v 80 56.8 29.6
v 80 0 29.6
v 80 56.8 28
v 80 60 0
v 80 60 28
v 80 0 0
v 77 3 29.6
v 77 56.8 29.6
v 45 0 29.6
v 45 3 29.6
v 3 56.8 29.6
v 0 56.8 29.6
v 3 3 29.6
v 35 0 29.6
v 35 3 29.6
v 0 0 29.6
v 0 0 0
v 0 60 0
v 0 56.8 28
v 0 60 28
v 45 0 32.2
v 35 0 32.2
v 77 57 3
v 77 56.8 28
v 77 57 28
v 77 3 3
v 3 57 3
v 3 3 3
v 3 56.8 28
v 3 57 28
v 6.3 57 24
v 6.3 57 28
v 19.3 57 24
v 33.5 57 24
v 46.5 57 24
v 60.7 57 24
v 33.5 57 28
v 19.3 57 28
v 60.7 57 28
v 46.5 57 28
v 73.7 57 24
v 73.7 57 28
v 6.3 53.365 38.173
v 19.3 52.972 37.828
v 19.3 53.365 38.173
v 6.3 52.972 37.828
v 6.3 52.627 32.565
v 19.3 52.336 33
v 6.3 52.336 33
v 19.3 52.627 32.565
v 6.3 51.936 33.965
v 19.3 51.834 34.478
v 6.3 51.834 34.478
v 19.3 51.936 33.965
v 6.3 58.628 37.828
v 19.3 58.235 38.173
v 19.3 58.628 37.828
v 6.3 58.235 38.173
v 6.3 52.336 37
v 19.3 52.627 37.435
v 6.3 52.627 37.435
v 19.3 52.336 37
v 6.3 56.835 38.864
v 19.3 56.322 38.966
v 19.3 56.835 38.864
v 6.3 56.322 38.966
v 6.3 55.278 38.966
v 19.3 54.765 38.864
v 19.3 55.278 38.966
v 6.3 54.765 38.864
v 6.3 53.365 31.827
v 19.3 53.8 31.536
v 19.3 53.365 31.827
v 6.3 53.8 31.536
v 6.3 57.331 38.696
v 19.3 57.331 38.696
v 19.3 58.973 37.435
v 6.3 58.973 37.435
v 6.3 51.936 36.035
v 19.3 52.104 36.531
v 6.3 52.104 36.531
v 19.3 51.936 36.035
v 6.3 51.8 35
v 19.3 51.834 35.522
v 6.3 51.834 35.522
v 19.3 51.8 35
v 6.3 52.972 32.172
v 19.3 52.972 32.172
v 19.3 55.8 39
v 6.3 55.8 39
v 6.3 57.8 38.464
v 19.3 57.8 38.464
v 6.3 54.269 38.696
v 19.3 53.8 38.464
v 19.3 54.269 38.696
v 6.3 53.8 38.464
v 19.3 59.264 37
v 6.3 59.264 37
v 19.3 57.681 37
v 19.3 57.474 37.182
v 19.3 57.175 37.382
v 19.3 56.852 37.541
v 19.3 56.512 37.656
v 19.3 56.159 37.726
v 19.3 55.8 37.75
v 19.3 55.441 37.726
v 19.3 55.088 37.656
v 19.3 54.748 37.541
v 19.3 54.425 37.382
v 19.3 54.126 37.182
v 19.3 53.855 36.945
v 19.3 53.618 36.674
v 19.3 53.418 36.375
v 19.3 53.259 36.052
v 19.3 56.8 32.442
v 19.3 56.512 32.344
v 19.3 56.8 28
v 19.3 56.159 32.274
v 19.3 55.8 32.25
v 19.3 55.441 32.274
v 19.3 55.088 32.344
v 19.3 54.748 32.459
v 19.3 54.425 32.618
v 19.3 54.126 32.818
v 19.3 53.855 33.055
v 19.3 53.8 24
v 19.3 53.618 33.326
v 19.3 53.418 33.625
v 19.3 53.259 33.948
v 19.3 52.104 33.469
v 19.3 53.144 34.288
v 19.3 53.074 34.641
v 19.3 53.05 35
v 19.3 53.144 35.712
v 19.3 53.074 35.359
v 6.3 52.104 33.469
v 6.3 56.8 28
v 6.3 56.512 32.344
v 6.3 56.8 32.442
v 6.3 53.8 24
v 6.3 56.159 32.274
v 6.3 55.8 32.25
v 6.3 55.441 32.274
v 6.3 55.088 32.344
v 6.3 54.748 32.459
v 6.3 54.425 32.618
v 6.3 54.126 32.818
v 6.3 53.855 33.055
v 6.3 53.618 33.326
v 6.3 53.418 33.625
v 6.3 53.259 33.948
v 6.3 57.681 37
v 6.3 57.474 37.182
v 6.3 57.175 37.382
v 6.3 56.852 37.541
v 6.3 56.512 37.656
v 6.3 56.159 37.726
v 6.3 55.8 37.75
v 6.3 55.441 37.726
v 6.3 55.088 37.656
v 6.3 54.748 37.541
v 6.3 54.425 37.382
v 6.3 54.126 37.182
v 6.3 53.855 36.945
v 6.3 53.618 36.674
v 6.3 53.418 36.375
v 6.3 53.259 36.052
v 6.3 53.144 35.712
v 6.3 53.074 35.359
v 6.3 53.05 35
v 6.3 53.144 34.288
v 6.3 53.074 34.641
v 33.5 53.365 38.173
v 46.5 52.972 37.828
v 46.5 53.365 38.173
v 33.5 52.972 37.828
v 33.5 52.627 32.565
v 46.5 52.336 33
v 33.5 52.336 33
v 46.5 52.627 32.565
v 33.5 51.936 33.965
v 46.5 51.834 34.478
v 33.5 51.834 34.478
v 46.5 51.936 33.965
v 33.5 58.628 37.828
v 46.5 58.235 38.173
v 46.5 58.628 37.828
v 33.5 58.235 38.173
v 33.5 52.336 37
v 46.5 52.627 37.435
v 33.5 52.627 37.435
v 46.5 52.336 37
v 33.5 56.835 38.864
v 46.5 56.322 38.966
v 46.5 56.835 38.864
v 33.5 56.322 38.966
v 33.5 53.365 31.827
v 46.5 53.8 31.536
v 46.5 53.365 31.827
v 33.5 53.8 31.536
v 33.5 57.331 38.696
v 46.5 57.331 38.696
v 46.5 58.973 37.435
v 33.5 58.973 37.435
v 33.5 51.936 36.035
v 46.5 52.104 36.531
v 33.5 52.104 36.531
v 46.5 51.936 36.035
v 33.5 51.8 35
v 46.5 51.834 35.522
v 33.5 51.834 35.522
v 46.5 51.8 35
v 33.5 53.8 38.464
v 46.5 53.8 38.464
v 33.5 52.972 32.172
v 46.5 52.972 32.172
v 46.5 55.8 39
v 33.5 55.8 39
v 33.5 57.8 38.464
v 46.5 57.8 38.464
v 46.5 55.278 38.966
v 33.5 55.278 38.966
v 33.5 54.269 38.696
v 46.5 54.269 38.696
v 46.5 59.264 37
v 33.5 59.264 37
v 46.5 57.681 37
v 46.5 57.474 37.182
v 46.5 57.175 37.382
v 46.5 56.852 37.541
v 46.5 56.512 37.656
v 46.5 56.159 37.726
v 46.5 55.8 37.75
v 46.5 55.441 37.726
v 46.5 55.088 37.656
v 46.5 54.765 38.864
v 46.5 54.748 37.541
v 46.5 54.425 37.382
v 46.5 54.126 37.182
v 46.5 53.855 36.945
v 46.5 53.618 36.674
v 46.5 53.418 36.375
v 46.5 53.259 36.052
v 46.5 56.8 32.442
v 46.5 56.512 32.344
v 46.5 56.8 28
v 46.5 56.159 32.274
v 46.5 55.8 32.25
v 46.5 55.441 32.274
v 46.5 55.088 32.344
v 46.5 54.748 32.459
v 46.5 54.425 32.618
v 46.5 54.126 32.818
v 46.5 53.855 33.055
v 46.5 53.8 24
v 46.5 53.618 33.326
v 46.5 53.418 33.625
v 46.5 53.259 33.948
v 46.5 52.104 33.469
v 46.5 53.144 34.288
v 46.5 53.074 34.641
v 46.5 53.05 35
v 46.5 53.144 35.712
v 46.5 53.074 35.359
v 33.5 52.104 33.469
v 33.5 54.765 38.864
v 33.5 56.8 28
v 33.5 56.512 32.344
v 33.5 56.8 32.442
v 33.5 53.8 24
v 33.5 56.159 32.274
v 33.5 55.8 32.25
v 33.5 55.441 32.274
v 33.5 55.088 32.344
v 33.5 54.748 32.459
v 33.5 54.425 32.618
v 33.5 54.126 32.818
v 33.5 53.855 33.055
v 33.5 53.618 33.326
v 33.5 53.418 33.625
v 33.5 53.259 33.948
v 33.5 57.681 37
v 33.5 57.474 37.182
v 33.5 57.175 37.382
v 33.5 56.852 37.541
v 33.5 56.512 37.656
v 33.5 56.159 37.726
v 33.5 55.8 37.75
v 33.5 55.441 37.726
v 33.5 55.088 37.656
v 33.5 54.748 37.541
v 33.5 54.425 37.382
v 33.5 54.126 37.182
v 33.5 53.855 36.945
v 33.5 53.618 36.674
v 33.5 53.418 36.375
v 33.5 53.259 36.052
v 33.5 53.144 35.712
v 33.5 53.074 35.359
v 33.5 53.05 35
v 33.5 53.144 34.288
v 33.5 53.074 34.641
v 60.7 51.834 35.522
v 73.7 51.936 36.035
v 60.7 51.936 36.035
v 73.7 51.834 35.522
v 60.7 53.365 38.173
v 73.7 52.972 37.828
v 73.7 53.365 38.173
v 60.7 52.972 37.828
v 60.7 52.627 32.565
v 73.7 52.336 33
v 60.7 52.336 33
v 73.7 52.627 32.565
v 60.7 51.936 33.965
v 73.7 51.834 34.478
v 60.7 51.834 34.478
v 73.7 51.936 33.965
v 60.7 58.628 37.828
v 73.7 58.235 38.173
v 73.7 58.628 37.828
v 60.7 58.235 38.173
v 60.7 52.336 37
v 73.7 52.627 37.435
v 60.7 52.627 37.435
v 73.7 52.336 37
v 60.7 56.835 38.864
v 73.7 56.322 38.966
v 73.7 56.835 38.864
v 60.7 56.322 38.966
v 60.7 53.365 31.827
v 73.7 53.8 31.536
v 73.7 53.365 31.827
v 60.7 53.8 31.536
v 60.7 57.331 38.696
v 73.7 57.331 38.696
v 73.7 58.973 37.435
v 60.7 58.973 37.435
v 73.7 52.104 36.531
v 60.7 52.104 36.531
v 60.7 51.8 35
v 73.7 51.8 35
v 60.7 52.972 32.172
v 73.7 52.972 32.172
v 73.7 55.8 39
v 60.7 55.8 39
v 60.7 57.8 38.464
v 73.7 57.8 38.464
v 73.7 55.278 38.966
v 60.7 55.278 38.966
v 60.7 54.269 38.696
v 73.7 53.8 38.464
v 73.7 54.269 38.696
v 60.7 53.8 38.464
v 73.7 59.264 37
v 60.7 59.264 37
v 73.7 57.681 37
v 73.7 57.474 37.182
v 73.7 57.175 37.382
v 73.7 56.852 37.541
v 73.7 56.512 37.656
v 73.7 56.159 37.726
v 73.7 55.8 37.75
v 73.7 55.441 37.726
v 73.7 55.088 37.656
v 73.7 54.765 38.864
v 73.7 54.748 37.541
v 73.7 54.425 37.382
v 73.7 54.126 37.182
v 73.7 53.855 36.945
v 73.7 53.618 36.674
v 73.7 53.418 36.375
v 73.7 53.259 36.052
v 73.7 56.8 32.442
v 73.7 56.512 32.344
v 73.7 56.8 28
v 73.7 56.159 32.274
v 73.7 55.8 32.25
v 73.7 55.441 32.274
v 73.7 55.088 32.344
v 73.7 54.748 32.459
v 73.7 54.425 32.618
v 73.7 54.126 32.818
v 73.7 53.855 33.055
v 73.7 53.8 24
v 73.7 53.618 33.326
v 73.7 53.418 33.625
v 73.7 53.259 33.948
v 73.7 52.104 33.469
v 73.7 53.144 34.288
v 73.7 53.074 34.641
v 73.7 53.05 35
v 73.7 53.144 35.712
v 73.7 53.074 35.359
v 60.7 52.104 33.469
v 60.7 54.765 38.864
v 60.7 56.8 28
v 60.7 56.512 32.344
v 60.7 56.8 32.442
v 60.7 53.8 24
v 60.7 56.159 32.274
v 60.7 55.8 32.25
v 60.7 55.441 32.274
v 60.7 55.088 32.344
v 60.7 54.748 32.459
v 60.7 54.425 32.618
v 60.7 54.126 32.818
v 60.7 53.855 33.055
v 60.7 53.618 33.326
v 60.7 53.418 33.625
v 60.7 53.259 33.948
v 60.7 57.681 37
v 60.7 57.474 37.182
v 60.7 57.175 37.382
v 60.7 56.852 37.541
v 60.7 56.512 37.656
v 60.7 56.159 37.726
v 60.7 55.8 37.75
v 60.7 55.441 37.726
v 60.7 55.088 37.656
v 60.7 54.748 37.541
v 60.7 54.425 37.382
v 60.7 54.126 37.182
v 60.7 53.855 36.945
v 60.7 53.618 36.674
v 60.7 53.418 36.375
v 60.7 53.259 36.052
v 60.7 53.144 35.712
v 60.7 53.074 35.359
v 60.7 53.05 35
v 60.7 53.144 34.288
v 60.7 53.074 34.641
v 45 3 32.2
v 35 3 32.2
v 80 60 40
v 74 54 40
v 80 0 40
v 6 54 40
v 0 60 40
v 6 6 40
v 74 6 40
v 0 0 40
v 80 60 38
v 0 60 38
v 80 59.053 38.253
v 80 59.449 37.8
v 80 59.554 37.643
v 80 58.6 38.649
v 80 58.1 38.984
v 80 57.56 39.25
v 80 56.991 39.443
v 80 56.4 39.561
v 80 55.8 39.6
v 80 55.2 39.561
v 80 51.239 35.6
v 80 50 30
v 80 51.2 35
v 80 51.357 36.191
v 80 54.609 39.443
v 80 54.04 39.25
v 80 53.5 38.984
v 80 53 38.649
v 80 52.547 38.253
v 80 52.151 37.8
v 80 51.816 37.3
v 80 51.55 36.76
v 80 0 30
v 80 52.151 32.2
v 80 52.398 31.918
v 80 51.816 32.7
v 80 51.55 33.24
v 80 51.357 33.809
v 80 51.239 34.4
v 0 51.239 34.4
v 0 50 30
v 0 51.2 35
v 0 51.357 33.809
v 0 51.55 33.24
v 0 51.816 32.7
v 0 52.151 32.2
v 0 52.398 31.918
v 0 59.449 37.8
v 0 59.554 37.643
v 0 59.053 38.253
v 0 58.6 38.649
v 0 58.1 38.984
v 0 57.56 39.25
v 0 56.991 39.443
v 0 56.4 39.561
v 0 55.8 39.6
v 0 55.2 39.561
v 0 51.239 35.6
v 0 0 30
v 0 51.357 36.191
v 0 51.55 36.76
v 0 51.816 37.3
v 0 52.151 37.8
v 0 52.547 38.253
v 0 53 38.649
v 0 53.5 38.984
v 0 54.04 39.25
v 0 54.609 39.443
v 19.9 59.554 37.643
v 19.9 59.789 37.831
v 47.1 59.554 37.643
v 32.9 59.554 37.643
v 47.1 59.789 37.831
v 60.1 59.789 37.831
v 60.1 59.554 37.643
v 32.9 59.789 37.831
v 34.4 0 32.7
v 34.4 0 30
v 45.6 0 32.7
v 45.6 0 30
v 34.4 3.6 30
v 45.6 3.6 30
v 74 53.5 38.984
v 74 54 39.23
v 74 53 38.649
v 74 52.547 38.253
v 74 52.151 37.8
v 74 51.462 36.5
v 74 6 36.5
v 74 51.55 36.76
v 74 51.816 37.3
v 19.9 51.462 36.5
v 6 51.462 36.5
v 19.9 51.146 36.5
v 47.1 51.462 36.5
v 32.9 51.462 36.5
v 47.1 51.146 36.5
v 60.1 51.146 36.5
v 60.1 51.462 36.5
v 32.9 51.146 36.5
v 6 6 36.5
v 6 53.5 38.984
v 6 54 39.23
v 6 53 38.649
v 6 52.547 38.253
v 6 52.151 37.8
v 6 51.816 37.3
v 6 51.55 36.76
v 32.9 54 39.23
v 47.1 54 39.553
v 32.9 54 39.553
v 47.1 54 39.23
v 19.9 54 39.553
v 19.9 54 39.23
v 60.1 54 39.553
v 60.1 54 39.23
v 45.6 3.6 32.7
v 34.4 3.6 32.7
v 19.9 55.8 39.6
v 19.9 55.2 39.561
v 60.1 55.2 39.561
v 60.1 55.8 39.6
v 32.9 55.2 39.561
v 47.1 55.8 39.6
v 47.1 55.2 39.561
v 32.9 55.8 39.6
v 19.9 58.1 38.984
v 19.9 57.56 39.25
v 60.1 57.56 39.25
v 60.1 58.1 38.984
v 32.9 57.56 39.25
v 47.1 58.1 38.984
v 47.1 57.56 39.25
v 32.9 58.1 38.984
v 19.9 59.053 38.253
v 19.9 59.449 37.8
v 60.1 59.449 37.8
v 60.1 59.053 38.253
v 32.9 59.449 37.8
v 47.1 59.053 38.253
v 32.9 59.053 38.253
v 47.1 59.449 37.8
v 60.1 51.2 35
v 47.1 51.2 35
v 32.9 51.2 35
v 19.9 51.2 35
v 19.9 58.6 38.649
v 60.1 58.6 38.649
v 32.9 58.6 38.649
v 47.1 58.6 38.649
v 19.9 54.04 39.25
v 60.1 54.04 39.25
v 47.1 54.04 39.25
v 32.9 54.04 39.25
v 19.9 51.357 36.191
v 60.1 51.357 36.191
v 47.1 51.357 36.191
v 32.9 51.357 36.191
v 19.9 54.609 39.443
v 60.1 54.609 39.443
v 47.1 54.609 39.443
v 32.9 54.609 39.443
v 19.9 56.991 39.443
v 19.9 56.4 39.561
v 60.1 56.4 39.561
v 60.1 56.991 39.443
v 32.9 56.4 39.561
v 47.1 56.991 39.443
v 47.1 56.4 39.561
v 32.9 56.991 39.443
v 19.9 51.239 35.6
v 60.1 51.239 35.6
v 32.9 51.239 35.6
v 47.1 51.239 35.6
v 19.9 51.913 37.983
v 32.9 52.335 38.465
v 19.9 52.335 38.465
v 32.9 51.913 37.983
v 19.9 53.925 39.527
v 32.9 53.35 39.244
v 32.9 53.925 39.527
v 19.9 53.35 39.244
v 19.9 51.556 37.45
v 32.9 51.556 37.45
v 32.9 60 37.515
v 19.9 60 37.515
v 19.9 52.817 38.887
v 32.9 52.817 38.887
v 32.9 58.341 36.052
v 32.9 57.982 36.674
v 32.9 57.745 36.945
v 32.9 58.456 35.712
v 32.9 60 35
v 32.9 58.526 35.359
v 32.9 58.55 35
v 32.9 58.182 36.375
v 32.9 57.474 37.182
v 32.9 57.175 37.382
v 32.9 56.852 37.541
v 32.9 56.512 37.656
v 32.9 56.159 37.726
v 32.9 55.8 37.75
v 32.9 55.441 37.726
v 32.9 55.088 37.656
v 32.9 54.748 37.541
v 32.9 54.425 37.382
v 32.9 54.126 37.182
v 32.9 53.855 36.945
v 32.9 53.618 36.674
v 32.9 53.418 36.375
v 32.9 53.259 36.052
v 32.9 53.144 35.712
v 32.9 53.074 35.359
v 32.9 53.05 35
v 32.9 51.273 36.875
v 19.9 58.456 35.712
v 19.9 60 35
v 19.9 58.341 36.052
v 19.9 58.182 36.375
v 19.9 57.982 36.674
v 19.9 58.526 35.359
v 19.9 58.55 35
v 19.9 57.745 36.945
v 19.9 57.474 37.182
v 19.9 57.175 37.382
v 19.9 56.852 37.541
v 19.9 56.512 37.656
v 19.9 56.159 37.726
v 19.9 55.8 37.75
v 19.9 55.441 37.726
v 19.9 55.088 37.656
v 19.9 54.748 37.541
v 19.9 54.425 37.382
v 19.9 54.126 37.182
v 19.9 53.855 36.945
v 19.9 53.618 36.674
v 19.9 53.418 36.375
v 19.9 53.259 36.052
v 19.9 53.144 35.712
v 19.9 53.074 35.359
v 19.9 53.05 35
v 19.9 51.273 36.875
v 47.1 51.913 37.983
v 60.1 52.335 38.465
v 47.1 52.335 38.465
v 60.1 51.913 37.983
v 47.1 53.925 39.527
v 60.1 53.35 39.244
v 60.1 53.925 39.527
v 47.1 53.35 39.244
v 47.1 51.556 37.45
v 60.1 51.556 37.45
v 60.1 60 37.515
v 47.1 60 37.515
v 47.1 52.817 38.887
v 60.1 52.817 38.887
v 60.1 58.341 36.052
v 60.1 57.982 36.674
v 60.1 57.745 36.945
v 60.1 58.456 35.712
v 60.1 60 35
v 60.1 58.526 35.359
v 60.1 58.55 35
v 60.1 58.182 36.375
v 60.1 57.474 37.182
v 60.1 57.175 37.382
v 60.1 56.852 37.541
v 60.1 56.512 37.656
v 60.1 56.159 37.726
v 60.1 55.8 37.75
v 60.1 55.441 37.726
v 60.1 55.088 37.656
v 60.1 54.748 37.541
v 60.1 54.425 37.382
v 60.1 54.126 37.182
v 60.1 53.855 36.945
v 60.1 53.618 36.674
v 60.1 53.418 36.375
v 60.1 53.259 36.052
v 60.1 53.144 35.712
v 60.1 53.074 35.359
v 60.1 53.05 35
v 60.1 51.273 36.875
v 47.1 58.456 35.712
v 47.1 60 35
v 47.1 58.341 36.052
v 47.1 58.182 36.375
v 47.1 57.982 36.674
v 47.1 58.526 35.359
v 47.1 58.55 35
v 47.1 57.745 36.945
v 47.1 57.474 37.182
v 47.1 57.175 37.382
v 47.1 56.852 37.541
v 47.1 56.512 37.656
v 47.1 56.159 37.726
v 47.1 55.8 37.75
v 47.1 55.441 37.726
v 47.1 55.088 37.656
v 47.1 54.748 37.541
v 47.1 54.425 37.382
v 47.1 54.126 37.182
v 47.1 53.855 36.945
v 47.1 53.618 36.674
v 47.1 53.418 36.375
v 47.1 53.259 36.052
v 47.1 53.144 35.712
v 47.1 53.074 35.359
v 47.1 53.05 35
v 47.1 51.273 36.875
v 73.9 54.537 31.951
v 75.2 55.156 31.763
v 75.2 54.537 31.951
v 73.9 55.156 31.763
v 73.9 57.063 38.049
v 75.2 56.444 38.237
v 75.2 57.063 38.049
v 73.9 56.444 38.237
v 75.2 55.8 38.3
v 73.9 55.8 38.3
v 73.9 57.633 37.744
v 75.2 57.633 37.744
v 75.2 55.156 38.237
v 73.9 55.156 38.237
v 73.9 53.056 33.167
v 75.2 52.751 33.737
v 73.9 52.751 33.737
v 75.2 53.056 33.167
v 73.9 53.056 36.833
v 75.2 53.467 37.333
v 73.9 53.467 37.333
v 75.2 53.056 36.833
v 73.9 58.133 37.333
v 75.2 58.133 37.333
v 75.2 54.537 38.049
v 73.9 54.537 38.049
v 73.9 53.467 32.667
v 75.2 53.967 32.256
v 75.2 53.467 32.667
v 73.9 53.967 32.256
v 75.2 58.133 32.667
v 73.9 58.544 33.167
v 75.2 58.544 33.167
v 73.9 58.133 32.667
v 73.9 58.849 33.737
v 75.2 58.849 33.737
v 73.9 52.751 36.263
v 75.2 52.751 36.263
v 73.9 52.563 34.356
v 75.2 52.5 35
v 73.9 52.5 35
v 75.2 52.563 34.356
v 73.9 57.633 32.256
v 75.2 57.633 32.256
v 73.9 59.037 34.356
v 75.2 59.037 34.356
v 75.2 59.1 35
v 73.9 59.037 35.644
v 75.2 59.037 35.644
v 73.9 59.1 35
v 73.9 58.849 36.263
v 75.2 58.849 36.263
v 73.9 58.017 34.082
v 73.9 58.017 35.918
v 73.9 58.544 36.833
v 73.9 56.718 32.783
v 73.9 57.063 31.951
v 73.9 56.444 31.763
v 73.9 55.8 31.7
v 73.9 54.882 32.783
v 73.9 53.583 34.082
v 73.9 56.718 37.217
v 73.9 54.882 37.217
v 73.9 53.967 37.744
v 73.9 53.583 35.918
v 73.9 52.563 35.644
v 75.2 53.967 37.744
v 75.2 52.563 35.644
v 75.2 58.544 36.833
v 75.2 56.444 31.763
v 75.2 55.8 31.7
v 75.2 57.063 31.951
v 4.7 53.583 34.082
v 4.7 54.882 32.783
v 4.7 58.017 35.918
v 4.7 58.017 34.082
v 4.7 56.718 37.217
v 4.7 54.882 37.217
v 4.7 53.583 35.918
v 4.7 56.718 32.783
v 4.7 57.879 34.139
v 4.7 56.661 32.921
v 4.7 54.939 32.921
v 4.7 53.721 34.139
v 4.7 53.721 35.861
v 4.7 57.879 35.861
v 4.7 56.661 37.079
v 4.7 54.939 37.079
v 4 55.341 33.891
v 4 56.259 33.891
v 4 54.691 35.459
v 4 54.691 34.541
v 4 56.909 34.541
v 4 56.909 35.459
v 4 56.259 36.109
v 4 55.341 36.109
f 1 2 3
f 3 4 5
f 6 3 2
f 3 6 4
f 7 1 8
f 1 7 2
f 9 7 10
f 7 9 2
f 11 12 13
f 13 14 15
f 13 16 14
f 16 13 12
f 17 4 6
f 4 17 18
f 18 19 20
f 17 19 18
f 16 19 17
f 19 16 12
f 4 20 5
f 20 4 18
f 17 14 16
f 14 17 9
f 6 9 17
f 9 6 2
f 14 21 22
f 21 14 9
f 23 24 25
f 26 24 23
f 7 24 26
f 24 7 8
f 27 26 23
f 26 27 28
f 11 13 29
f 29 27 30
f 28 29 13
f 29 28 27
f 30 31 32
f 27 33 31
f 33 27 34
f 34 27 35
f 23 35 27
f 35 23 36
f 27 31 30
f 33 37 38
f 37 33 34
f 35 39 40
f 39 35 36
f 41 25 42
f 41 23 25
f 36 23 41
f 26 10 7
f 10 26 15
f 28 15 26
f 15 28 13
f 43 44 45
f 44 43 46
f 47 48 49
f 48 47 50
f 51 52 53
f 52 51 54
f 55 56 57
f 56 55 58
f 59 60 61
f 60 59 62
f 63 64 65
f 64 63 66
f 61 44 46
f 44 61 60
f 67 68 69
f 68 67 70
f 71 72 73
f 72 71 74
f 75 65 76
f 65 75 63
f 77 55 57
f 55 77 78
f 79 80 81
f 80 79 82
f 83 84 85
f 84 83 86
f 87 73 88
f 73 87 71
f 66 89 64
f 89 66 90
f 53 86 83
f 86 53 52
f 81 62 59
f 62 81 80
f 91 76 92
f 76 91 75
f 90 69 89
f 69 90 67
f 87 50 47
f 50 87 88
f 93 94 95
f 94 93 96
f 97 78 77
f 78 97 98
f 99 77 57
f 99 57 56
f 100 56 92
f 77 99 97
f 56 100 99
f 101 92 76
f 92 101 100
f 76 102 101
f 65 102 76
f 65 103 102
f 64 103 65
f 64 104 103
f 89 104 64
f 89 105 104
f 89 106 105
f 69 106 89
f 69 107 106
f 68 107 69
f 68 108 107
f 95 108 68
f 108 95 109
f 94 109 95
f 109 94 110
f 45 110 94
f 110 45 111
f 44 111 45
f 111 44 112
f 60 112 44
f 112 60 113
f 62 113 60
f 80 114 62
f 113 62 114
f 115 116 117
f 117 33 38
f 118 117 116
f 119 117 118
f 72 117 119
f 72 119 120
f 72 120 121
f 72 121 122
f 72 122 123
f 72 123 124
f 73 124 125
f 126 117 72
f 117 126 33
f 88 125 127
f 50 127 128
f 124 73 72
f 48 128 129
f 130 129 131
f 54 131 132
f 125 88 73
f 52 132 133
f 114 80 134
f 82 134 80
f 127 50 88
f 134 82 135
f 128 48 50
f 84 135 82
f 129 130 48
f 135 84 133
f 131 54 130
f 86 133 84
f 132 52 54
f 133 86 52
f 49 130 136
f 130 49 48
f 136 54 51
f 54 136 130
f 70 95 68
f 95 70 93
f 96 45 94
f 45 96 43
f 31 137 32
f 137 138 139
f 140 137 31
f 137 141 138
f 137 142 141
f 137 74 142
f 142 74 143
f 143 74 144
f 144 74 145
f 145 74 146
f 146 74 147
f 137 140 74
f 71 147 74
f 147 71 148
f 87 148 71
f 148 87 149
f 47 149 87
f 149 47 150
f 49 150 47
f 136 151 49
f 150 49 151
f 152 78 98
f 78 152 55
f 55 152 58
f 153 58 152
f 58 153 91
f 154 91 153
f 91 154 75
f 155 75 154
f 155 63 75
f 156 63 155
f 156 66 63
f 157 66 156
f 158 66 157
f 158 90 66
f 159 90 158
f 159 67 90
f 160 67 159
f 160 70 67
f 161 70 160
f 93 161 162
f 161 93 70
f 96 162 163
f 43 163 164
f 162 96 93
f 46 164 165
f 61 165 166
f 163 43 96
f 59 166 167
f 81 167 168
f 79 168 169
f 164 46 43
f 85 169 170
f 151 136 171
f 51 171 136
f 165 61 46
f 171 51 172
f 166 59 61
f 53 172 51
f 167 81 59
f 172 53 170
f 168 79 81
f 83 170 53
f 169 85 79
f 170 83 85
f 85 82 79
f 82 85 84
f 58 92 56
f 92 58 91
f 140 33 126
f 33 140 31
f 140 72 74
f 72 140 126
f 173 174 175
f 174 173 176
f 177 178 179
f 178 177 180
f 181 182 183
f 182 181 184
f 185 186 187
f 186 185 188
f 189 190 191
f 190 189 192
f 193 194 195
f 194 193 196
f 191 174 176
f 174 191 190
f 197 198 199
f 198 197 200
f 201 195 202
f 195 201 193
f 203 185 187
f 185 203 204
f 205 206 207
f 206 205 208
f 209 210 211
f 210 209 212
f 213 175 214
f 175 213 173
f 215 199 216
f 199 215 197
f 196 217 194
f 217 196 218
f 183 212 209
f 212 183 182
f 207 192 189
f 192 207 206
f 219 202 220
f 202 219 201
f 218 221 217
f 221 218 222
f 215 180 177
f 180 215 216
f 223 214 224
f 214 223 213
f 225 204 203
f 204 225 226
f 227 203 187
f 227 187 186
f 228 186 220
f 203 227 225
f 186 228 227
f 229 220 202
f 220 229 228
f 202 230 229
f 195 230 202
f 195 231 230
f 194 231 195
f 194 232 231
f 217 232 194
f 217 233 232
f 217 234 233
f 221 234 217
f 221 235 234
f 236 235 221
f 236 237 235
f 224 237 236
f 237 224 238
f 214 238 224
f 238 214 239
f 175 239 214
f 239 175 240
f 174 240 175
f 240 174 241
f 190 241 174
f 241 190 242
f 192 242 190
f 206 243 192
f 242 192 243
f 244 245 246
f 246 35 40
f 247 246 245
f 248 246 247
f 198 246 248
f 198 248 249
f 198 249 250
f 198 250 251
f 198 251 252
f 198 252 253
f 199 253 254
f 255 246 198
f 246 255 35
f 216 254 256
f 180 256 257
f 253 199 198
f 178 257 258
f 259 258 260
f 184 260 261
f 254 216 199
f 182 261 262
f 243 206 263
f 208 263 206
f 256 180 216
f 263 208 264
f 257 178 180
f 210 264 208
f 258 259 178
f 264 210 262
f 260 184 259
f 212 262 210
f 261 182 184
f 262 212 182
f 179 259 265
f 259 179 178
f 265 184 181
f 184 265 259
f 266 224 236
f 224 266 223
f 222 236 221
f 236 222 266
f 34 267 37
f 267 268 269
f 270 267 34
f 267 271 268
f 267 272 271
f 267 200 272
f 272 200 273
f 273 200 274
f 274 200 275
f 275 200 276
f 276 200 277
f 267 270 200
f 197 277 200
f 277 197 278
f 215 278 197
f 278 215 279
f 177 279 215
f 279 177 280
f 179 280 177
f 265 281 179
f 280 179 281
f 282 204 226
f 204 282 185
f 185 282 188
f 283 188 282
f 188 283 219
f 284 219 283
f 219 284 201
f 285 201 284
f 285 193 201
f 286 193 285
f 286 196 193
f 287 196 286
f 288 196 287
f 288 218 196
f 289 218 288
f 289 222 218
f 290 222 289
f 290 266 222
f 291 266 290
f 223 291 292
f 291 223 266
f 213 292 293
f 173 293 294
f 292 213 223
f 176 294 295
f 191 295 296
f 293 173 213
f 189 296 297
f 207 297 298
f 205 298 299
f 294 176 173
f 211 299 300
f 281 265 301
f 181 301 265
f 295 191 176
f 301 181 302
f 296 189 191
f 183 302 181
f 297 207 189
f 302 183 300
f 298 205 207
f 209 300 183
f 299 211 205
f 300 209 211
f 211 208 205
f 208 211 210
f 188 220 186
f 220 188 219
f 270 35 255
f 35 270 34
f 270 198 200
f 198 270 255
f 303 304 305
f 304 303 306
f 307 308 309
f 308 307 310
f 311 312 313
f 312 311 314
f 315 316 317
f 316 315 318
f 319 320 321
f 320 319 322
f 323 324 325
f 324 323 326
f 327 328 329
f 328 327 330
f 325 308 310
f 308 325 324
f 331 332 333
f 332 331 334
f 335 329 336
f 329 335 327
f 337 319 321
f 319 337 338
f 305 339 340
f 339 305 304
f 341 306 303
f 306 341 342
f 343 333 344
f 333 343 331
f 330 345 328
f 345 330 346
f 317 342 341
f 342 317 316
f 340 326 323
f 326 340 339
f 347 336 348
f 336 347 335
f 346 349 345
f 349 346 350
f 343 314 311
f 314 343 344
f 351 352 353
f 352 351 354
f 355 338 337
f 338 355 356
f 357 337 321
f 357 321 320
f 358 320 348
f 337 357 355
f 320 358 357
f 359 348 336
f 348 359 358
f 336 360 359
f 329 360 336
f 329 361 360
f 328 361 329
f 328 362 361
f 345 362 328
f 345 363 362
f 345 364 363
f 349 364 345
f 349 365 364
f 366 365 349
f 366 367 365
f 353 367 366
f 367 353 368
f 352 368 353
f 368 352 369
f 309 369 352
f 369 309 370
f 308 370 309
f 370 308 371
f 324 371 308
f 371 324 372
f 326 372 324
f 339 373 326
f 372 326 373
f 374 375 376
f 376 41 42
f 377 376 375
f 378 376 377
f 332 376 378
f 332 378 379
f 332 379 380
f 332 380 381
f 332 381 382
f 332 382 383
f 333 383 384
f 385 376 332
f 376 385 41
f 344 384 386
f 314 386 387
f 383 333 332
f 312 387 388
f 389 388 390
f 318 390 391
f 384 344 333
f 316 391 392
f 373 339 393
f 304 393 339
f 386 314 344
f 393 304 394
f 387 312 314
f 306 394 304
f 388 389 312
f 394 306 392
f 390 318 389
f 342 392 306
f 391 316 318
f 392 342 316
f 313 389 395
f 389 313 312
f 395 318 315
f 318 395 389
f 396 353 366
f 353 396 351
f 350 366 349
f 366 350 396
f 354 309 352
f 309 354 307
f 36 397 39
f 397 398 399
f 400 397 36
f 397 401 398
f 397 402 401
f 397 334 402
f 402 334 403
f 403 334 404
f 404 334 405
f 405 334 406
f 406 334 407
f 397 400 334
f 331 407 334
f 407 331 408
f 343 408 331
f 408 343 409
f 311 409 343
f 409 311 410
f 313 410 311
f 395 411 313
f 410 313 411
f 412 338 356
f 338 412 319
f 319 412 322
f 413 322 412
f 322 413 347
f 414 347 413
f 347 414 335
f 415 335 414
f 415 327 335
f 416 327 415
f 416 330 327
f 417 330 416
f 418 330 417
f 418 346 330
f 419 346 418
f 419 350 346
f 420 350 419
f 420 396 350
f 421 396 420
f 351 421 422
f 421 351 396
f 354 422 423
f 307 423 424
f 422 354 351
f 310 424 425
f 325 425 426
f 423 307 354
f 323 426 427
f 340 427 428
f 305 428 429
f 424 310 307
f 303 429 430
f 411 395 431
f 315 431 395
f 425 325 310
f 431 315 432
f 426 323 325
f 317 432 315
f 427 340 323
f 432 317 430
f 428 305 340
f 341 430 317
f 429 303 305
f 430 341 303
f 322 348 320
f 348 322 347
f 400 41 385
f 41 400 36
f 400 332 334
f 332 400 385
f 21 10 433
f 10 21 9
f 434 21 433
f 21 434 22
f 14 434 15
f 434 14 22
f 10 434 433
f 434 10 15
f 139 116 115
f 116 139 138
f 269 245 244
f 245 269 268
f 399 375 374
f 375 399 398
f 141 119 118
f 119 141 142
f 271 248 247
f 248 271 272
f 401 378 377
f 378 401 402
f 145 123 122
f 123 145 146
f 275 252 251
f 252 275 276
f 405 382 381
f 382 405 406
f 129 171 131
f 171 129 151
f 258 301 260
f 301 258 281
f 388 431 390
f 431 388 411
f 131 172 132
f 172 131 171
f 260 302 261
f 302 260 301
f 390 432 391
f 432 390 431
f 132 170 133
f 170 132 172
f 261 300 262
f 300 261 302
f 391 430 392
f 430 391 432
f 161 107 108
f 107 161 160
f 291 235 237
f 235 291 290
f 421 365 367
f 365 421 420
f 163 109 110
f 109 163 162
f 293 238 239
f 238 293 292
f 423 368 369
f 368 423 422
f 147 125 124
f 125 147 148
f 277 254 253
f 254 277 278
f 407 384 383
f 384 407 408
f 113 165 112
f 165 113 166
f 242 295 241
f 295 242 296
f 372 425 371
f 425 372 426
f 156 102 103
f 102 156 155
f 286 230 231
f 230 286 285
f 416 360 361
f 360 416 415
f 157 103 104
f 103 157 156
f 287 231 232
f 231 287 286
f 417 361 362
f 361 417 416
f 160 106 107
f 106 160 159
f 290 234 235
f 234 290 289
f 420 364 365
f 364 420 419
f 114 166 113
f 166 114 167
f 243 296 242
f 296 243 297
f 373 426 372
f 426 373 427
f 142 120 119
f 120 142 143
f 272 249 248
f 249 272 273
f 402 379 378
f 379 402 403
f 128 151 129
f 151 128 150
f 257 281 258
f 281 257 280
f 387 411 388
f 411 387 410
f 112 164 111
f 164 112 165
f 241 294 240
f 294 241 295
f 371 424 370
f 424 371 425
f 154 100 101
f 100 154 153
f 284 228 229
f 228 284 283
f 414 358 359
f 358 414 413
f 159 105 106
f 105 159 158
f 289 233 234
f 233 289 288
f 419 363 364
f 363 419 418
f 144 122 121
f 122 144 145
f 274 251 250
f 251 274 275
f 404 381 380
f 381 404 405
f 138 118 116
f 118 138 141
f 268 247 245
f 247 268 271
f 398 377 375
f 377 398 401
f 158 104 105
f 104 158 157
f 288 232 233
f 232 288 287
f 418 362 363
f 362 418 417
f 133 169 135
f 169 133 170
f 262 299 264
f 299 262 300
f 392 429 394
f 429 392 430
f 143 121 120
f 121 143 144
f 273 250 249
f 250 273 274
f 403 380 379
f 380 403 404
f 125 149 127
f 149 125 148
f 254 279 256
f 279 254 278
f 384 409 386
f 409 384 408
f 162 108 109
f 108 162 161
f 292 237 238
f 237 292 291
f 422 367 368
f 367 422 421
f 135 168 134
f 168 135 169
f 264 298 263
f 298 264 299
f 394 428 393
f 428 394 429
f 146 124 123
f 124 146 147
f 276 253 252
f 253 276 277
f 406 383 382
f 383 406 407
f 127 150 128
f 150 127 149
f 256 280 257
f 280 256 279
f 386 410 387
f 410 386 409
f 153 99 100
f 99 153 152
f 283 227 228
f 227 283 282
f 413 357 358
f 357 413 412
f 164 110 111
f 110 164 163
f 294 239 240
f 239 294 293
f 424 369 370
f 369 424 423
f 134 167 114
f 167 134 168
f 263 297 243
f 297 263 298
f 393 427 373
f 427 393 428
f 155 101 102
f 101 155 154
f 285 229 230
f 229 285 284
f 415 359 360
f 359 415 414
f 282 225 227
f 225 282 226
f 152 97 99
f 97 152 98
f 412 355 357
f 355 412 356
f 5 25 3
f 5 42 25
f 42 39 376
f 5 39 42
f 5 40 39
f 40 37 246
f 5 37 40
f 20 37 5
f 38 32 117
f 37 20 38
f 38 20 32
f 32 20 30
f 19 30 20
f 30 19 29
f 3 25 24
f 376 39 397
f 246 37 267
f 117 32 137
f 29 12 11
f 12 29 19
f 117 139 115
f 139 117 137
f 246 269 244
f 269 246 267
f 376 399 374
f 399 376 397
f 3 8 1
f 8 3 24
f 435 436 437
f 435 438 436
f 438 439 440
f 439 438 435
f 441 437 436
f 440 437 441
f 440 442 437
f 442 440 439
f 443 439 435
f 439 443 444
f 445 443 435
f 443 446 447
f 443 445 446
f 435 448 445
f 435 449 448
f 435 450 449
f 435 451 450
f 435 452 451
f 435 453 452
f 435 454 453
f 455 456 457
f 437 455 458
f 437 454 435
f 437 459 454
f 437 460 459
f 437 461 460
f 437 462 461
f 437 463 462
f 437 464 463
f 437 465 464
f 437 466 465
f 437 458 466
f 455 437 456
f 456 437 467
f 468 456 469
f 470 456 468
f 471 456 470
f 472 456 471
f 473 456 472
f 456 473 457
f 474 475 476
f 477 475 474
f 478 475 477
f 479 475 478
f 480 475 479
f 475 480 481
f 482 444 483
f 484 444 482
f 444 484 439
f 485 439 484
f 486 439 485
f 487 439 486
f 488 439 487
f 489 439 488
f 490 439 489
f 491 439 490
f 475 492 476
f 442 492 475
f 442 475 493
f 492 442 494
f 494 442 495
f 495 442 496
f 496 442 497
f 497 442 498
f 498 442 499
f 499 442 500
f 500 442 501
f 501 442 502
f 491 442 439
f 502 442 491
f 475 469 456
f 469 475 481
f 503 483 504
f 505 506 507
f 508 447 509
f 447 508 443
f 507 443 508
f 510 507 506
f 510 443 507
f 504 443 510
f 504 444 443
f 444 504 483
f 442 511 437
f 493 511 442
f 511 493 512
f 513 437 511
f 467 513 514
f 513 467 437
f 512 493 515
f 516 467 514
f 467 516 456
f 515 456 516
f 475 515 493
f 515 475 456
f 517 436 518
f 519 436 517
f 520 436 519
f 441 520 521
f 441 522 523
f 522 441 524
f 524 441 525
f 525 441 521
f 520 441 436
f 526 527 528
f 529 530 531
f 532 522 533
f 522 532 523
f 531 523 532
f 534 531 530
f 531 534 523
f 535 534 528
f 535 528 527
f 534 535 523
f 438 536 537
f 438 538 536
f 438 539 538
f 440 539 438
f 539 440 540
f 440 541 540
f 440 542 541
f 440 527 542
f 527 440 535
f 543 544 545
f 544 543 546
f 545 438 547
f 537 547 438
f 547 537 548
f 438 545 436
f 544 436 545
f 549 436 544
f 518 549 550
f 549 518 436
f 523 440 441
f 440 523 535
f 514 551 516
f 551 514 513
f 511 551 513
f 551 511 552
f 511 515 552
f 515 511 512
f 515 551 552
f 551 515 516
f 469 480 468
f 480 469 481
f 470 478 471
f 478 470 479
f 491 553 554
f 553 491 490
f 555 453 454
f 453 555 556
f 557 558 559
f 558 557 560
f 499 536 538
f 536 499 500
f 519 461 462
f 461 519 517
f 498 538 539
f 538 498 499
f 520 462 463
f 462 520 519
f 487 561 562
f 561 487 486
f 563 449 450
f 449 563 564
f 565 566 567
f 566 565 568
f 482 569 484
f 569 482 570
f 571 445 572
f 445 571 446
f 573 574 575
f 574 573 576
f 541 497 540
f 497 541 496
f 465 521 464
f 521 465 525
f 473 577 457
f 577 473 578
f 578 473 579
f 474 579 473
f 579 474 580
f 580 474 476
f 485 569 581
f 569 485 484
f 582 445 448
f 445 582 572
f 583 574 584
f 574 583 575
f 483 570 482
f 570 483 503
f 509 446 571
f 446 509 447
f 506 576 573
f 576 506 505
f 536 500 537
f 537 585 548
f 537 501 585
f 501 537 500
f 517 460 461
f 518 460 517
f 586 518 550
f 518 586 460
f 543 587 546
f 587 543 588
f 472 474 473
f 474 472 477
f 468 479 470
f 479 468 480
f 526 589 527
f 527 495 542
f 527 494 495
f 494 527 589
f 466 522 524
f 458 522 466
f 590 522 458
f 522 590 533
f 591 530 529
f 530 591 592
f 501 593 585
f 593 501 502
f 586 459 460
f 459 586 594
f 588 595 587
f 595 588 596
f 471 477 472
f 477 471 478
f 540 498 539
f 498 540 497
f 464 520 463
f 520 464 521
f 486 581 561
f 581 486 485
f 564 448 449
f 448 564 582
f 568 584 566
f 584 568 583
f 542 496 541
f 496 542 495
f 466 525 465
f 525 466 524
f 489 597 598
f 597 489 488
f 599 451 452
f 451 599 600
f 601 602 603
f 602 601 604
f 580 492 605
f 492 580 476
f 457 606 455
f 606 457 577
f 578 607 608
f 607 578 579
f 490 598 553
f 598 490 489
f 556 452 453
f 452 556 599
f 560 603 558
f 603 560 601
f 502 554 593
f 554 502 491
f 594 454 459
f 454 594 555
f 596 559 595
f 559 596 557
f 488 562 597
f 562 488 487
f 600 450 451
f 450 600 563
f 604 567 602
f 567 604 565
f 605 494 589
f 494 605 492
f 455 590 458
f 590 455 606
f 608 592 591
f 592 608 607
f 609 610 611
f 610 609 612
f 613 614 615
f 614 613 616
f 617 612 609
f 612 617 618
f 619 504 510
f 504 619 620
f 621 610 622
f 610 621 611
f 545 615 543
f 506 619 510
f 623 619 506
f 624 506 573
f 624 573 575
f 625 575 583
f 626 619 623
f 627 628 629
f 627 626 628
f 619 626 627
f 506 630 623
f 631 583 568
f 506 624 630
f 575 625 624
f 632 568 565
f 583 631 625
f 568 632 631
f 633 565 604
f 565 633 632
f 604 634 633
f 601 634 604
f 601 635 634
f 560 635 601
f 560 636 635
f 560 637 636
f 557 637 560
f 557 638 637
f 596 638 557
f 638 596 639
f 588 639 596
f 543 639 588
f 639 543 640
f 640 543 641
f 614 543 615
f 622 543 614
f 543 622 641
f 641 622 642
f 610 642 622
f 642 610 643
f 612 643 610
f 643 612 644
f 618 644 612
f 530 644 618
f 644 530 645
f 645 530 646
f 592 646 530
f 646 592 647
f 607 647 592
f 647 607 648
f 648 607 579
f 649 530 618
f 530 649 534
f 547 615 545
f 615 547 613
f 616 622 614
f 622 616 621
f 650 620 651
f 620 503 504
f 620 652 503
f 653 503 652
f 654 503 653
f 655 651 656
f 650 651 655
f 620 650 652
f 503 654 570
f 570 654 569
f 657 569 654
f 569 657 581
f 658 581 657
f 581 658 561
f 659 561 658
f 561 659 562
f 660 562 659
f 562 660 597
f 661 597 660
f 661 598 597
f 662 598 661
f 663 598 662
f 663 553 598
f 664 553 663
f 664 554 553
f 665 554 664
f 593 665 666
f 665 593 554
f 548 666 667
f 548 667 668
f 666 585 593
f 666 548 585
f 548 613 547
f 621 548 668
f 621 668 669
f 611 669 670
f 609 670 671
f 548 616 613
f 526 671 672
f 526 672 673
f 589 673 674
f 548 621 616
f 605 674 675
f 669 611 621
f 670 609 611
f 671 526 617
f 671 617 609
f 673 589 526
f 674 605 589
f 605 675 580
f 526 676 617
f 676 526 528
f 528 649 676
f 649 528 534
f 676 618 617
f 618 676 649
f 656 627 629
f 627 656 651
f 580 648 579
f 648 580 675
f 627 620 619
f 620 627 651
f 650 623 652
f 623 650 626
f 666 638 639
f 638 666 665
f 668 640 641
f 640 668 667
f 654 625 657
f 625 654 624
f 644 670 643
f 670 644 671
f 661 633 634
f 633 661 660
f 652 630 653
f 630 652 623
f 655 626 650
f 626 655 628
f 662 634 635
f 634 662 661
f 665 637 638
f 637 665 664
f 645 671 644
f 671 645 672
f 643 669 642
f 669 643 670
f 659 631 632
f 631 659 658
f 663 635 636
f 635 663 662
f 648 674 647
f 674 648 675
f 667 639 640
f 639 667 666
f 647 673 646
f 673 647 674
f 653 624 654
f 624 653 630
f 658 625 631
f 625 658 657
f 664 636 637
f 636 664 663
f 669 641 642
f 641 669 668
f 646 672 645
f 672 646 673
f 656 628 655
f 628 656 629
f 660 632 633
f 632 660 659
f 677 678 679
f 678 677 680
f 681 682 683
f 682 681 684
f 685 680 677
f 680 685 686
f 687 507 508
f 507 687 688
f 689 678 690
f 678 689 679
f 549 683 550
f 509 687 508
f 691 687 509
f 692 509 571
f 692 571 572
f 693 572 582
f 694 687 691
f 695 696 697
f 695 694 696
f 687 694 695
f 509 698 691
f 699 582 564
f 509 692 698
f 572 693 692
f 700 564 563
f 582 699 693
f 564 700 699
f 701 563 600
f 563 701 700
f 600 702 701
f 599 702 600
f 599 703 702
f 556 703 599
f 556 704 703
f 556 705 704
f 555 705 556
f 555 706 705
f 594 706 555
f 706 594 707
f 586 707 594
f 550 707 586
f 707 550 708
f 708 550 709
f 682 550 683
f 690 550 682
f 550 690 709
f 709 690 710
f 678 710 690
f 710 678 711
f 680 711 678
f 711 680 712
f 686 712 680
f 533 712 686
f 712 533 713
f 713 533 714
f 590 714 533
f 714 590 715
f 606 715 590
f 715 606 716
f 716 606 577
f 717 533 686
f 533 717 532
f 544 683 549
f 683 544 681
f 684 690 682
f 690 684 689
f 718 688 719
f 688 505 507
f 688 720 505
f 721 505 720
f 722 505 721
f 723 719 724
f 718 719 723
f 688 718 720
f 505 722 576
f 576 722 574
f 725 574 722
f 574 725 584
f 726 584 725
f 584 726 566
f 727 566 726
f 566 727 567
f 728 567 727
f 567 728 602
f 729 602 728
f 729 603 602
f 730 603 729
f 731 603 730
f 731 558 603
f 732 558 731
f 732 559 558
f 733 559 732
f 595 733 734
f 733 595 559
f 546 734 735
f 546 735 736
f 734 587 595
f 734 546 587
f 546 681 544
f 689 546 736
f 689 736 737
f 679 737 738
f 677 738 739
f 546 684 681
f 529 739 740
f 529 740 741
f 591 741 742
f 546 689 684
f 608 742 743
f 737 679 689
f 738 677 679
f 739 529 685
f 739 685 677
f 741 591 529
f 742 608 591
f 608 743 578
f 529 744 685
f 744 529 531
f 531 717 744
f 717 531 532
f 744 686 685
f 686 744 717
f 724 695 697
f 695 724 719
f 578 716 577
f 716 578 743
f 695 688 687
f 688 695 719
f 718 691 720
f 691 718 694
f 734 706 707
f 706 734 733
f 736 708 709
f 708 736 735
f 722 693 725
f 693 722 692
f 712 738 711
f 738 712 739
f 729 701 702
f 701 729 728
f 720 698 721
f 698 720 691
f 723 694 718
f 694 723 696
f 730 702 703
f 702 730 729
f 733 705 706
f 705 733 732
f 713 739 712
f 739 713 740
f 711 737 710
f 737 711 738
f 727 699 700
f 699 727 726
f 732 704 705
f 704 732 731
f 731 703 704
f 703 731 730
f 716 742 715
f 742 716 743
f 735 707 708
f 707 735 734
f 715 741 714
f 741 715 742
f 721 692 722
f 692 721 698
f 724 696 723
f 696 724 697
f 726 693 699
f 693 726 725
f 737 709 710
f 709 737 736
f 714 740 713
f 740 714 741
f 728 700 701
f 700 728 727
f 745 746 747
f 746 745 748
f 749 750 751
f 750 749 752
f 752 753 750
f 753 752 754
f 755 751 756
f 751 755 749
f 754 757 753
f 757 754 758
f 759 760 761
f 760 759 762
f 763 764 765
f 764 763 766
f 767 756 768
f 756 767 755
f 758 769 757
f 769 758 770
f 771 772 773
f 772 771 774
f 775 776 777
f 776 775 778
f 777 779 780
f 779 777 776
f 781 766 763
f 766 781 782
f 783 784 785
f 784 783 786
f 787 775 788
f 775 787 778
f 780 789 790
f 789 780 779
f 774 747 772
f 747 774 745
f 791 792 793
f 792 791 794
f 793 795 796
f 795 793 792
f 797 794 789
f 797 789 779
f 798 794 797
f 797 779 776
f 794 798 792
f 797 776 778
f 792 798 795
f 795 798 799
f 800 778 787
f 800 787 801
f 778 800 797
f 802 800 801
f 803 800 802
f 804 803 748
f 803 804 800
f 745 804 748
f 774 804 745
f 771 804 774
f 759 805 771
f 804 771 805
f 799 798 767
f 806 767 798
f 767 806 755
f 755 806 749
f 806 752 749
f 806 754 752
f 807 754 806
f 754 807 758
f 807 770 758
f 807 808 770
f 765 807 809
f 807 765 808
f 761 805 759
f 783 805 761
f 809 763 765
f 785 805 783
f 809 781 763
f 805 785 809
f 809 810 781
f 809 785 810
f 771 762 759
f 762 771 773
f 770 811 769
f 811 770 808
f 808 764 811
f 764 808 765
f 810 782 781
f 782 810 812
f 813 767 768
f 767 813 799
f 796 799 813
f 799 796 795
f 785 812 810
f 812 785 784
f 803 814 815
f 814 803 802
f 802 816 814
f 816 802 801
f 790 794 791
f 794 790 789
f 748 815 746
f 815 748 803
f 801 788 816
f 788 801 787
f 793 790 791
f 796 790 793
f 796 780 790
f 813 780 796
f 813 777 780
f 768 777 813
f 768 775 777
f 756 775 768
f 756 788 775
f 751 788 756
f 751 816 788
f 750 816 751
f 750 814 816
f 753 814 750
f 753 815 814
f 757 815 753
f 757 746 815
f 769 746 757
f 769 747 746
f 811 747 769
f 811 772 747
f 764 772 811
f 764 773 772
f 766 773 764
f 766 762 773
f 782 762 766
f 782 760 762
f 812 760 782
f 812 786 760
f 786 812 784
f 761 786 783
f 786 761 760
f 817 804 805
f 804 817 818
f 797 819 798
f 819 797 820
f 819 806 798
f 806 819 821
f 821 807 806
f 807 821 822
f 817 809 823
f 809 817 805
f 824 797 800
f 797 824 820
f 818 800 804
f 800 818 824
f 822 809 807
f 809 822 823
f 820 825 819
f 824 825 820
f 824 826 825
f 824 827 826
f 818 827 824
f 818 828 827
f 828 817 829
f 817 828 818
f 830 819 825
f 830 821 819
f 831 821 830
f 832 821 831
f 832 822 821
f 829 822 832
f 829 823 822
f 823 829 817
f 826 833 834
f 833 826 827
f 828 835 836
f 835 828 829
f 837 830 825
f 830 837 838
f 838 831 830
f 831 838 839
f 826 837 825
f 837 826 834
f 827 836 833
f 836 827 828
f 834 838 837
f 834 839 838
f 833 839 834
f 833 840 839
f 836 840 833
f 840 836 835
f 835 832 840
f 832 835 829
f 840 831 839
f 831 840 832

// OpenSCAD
// Print-in-place hinged box, 80 x 60 x 40 mm closed.
// Printed closed in PLA (Bambu A1, 0.4 nozzle): base, lid and a captive
// hinge pin are separate bodies with 0.35-0.6 mm clearances, so the hinge
// breaks free by hand.  No supports: the lid underside bridges the cavity,
// the hinge barrels/pin use faceted (octagonal) lower surfaces, and all
// other downward faces are short bridges or rest on the body below.

/* [Part] */
part = "assembly"; // [assembly, box, lid, pin]

/* [Dimensions] */
box_w = 80;          // X, outside
box_d = 60;          // Y, outside (front y=0, back y=60)
box_h = 29.6;        // base height to its rim
lid_h = 10;          // lid height; lid bottom at z=30 (0.4 gap)
lid_z = 30;
wall = 3;
floor_t = 3;
total_h = 40;

hinge_y = 55.8;      // hinge axis, assembly coords
hinge_z = 35;
barrel_r = 4.0;
pin_r = 2.4;         // octagon circumradius
bore_r = 2.75;       // pin_r + 0.35 radial clearance
relief_r = 4.6;      // barrel_r + 0.6

// Alternating knuckles along the back edge (x intervals), 0.6 mm end gaps.
box_segs  = [[6.3, 19.3], [33.5, 46.5], [60.7, 73.7]];
lid_segs  = [[19.9, 32.9], [47.1, 60.1]];

cadverify_only = "";
module instance(name, part_name, unit = 1) {
    echo(cadverify_instance = [name, part_name, unit]);
    if (cadverify_only == "" || cadverify_only == name) children();
}

// ---------------------------------------------------------------- base (box)
module box_main() {
    difference() {
        union() {
            // shell: outer block minus open-top cavity
            difference() {
                cube([box_w, box_d, box_h]);
                translate([wall, wall, floor_t]) cube([box_w - 2 * wall, box_d - 2 * wall, box_h]);
            }
            // hinge knuckles (base) + support posts down to the back wall
            for (s = box_segs) {
                translate([s[0], hinge_y, hinge_z]) rotate([0, 90, 0])
                    cylinder(h = s[1] - s[0], r = barrel_r, $fn = 48);
                translate([s[0], 53.8, 24]) cube([s[1] - s[0], 6.2, 11.5]);
            }
            // front catch tooth (enters the socket in the lid)
            translate([35, 0, box_h]) cube([10, wall, 2.6]);
        }
        // pin bore through the base knuckles
        translate([-1, hinge_y, hinge_z]) rotate([0, 90, 0])
            cylinder(h = box_w + 2, r = bore_r, $fn = 48);
        // swing clearance notch: rear strip of wall/posts above z=28,
        // behind y=56.8, so the lid's rear lip clears it past 90 deg
        translate([-1, 56.8, 28]) cube([box_w + 2, 5, 9]);
    }
}

// ---------------------------------------------------------------- lid (local: z 0..10, hinge axis at z=5)
module lid_main() {
    union() {
        difference() {
            union() {
                // main slab, side profile (Y-Z) extruded along X.
                // Rear lower edge chamfered 50,0 -> 60,8 so the slab
                // swings clear of the base back wall.
                rotate([0, 90, 0])
                    linear_extrude(height = box_w)
                        polygon(points = [[0, 0], [0, 50], [-8, 60], [-10, 60], [-10, 0]]);
                // hinge knuckles (lid)
                for (s = lid_segs)
                    translate([s[0], hinge_y, 5]) rotate([0, 90, 0])
                        cylinder(h = s[1] - s[0], r = barrel_r, $fn = 48);
            }
            // recessed panel in the top face
            translate([6, 6, 6.5]) cube([68, 48, 4]);
            // front catch socket (tooth: x35..45, z assy 29.6..32.2)
            translate([34.4, -1, -0.5]) cube([11.2, 4.6, 3.2]);
            // clearance tunnel for the base knuckles / pin
            translate([-1, hinge_y, 5]) rotate([0, 90, 0])
                cylinder(h = box_w + 2, r = relief_r, $fn = 48);
            // pin bore through the lid knuckles
            translate([-1, hinge_y, 5]) rotate([0, 90, 0])
                cylinder(h = box_w + 2, r = bore_r, $fn = 48);
        }
        // webs joining lid knuckles to the slab: upper half-discs r=4.9
        // (stay above z=30.1 in assembly, clear of the base rim at 29.6)
        for (s = lid_segs)
            difference() {
                intersection() {
                    translate([s[0], hinge_y, 5]) rotate([0, 90, 0])
                        cylinder(h = s[1] - s[0], r = 4.9, $fn = 48);
                    translate([s[0], hinge_y - 10, 5]) cube([s[1] - s[0], 20, 5]);
                    translate([s[0], 0, 0]) cube([s[1] - s[0], box_d, lid_h]);
                }
                translate([s[0] - 1, hinge_y, 5]) rotate([0, 90, 0])
                    cylinder(h = s[1] - s[0] + 2, r = bore_r, $fn = 48);
            }
    }
}

// ---------------------------------------------------------------- pin
// Centred on its axis, local +Z from head (z=0) to tip (z=71.2).
module pin_geom() {
    union() {
        cylinder(h = 1.3, r = 3.3, $fn = 32);                    // head
        translate([0, 0, 1.0]) rotate([0, 0, 22.5])
            cylinder(h = 69.5, r = pin_r, $fn = 8);              // octagonal shaft
        translate([0, 0, 70.4]) rotate([0, 0, 22.5])
            cylinder(h = 0.8, r1 = pin_r, r2 = 1.2, $fn = 8);    // lead-in tip
    }
}
module pin_part() { translate([3.3, 3.3, 0]) pin_geom(); }

// ---------------------------------------------------------------- output
if (part == "box") {
    echo(cadverify_spec = [
        ["bounds", [[0, 0, 0], [box_w, box_d, hinge_z + barrel_r]]],
        ["bodies", 1],
        ["copies", 1],
        ["support_faces", [["bed", "-z", 4000]]],
        ["overhangs_allowed", [["hinge knuckles and pin bore print in place; faceted bore ceiling is a short internal bridge", [[5, 51, 30], [75, 60, 39.5]]], ["knuckle support ledge underside, 3.2 mm protrusion bridging to the back wall", [[5, 53, 23], [75, 58, 25]]]]],
        ["details", [
            ["cavity", "void", [[4, 4, 10], [76, 53, 29]], 0.95],
            ["front_wall", "thickness", [40, -1, 15], [0, 1, 0], 3],
            ["floor", "thickness", [40, 30, -1], [0, 0, 1], 3],
            ["box_knuckle", "material", [[7, 52, 33.5], [18, 53.8, 36.5]], 0.6],
            ["pin_bore", "void", [[8, 54.9, 34.1], [17, 56.7, 35.9]], 0.9],
            ["catch_tooth", "material", [[36, 0.5, 30], [44, 2.5, 32]], 0.85],
            ["hinge_knuckles", "view", [[4, 50, 28], [76, 60, 39.5]]]
        ]]
    ]);
    box_main();
} else if (part == "lid") {
    echo(cadverify_spec = [
        ["bounds", [[0, 0, 0], [box_w, box_d, lid_h]]],
        ["bodies", 1],
        ["copies", 1],
        ["support_faces", [["print_face", "-z", 3000]]],
        ["overhangs_allowed", [["lid hinge relief, knuckle bores and rear swing chamfer print in place around pin and box knuckles; ceilings are short internal bridges and the chamfer is 51 deg", [[0, 49, 0], [80, 60, 10]]], ["catch socket ceiling, 11 mm bridge across the socket", [[33, 0, 2], [47, 4, 3.5]]]]],
        ["details", [
            ["top_pocket", "void", [[7, 7, 6.6], [73, 53, 9.9]], 0.95],
            ["lid_slab", "thickness", [40, 30, 9], [0, 0, -1], 6.5],
            ["lid_knuckle", "material", [[21, 52, 3.5], [32, 53.8, 6.5]], 0.3],
            ["pin_bore", "void", [[22, 55.4, 4.6], [31, 56.2, 5.4]], 0.45],
            ["catch_socket", "void", [[35, 0.5, 0.2], [45, 2.5, 2.5]], 0.9],
            ["hinge_knuckles", "view", [[4, 50, 0], [76, 60, 10]]]
        ]]
    ]);
    lid_main();
} else if (part == "pin") {
    echo(cadverify_spec = [
        ["bounds", [[0, 0, 0], [6.6, 6.6, 71.2]]],
        ["bodies", 1],
        ["copies", 1],
        ["support_faces", [["head_base", "-z", 30]]],
        ["overhangs_allowed", []],
        ["details", [
            ["pin_shaft", "material", [[2, 2, 10], [4.6, 4.6, 20]], 0.9],
            ["pin_head", "material", [[1, 1, 0.1], [5.6, 5.6, 1.2]], 0.75],
            ["pin_length", "thickness", [1.2, 3.3, 72], [0, 0, -1], 71.2],
            ["pin_head_view", "view", [[0, 0, 0], [6.6, 6.6, 2]]]
        ]]
    ]);
    pin_part();
} else if (part == "assembly") {
    echo(cadverify_spec = [
        ["bounds", [[0, 0, 0], [box_w, box_d, total_h]]],
        ["support_faces", [["bed", "-z", 4000]]],
        ["allowed_interferences", []],
        ["motions", [
            ["lid_swing", ["lid"], "rotate", [0, hinge_y, hinge_z], [-1, 0, 0], [0, 110]]
        ]],
        ["assembly_order", [
            [["base"], [0, 0, 0]],
            [["pin"], [-1, 0, 0]],
            [["lid"], [0, 0, -1], ["rotate", [0, hinge_y, hinge_z], [-1, 0, 0], 110]]
        ]]
    ]);
    instance("base", "box") box_main();
    instance("lid", "lid") translate([0, 0, lid_z]) lid_main();
    instance("pin", "pin") translate([75.2, hinge_y, hinge_z]) rotate([0, -90, 0]) pin_geom();
}
